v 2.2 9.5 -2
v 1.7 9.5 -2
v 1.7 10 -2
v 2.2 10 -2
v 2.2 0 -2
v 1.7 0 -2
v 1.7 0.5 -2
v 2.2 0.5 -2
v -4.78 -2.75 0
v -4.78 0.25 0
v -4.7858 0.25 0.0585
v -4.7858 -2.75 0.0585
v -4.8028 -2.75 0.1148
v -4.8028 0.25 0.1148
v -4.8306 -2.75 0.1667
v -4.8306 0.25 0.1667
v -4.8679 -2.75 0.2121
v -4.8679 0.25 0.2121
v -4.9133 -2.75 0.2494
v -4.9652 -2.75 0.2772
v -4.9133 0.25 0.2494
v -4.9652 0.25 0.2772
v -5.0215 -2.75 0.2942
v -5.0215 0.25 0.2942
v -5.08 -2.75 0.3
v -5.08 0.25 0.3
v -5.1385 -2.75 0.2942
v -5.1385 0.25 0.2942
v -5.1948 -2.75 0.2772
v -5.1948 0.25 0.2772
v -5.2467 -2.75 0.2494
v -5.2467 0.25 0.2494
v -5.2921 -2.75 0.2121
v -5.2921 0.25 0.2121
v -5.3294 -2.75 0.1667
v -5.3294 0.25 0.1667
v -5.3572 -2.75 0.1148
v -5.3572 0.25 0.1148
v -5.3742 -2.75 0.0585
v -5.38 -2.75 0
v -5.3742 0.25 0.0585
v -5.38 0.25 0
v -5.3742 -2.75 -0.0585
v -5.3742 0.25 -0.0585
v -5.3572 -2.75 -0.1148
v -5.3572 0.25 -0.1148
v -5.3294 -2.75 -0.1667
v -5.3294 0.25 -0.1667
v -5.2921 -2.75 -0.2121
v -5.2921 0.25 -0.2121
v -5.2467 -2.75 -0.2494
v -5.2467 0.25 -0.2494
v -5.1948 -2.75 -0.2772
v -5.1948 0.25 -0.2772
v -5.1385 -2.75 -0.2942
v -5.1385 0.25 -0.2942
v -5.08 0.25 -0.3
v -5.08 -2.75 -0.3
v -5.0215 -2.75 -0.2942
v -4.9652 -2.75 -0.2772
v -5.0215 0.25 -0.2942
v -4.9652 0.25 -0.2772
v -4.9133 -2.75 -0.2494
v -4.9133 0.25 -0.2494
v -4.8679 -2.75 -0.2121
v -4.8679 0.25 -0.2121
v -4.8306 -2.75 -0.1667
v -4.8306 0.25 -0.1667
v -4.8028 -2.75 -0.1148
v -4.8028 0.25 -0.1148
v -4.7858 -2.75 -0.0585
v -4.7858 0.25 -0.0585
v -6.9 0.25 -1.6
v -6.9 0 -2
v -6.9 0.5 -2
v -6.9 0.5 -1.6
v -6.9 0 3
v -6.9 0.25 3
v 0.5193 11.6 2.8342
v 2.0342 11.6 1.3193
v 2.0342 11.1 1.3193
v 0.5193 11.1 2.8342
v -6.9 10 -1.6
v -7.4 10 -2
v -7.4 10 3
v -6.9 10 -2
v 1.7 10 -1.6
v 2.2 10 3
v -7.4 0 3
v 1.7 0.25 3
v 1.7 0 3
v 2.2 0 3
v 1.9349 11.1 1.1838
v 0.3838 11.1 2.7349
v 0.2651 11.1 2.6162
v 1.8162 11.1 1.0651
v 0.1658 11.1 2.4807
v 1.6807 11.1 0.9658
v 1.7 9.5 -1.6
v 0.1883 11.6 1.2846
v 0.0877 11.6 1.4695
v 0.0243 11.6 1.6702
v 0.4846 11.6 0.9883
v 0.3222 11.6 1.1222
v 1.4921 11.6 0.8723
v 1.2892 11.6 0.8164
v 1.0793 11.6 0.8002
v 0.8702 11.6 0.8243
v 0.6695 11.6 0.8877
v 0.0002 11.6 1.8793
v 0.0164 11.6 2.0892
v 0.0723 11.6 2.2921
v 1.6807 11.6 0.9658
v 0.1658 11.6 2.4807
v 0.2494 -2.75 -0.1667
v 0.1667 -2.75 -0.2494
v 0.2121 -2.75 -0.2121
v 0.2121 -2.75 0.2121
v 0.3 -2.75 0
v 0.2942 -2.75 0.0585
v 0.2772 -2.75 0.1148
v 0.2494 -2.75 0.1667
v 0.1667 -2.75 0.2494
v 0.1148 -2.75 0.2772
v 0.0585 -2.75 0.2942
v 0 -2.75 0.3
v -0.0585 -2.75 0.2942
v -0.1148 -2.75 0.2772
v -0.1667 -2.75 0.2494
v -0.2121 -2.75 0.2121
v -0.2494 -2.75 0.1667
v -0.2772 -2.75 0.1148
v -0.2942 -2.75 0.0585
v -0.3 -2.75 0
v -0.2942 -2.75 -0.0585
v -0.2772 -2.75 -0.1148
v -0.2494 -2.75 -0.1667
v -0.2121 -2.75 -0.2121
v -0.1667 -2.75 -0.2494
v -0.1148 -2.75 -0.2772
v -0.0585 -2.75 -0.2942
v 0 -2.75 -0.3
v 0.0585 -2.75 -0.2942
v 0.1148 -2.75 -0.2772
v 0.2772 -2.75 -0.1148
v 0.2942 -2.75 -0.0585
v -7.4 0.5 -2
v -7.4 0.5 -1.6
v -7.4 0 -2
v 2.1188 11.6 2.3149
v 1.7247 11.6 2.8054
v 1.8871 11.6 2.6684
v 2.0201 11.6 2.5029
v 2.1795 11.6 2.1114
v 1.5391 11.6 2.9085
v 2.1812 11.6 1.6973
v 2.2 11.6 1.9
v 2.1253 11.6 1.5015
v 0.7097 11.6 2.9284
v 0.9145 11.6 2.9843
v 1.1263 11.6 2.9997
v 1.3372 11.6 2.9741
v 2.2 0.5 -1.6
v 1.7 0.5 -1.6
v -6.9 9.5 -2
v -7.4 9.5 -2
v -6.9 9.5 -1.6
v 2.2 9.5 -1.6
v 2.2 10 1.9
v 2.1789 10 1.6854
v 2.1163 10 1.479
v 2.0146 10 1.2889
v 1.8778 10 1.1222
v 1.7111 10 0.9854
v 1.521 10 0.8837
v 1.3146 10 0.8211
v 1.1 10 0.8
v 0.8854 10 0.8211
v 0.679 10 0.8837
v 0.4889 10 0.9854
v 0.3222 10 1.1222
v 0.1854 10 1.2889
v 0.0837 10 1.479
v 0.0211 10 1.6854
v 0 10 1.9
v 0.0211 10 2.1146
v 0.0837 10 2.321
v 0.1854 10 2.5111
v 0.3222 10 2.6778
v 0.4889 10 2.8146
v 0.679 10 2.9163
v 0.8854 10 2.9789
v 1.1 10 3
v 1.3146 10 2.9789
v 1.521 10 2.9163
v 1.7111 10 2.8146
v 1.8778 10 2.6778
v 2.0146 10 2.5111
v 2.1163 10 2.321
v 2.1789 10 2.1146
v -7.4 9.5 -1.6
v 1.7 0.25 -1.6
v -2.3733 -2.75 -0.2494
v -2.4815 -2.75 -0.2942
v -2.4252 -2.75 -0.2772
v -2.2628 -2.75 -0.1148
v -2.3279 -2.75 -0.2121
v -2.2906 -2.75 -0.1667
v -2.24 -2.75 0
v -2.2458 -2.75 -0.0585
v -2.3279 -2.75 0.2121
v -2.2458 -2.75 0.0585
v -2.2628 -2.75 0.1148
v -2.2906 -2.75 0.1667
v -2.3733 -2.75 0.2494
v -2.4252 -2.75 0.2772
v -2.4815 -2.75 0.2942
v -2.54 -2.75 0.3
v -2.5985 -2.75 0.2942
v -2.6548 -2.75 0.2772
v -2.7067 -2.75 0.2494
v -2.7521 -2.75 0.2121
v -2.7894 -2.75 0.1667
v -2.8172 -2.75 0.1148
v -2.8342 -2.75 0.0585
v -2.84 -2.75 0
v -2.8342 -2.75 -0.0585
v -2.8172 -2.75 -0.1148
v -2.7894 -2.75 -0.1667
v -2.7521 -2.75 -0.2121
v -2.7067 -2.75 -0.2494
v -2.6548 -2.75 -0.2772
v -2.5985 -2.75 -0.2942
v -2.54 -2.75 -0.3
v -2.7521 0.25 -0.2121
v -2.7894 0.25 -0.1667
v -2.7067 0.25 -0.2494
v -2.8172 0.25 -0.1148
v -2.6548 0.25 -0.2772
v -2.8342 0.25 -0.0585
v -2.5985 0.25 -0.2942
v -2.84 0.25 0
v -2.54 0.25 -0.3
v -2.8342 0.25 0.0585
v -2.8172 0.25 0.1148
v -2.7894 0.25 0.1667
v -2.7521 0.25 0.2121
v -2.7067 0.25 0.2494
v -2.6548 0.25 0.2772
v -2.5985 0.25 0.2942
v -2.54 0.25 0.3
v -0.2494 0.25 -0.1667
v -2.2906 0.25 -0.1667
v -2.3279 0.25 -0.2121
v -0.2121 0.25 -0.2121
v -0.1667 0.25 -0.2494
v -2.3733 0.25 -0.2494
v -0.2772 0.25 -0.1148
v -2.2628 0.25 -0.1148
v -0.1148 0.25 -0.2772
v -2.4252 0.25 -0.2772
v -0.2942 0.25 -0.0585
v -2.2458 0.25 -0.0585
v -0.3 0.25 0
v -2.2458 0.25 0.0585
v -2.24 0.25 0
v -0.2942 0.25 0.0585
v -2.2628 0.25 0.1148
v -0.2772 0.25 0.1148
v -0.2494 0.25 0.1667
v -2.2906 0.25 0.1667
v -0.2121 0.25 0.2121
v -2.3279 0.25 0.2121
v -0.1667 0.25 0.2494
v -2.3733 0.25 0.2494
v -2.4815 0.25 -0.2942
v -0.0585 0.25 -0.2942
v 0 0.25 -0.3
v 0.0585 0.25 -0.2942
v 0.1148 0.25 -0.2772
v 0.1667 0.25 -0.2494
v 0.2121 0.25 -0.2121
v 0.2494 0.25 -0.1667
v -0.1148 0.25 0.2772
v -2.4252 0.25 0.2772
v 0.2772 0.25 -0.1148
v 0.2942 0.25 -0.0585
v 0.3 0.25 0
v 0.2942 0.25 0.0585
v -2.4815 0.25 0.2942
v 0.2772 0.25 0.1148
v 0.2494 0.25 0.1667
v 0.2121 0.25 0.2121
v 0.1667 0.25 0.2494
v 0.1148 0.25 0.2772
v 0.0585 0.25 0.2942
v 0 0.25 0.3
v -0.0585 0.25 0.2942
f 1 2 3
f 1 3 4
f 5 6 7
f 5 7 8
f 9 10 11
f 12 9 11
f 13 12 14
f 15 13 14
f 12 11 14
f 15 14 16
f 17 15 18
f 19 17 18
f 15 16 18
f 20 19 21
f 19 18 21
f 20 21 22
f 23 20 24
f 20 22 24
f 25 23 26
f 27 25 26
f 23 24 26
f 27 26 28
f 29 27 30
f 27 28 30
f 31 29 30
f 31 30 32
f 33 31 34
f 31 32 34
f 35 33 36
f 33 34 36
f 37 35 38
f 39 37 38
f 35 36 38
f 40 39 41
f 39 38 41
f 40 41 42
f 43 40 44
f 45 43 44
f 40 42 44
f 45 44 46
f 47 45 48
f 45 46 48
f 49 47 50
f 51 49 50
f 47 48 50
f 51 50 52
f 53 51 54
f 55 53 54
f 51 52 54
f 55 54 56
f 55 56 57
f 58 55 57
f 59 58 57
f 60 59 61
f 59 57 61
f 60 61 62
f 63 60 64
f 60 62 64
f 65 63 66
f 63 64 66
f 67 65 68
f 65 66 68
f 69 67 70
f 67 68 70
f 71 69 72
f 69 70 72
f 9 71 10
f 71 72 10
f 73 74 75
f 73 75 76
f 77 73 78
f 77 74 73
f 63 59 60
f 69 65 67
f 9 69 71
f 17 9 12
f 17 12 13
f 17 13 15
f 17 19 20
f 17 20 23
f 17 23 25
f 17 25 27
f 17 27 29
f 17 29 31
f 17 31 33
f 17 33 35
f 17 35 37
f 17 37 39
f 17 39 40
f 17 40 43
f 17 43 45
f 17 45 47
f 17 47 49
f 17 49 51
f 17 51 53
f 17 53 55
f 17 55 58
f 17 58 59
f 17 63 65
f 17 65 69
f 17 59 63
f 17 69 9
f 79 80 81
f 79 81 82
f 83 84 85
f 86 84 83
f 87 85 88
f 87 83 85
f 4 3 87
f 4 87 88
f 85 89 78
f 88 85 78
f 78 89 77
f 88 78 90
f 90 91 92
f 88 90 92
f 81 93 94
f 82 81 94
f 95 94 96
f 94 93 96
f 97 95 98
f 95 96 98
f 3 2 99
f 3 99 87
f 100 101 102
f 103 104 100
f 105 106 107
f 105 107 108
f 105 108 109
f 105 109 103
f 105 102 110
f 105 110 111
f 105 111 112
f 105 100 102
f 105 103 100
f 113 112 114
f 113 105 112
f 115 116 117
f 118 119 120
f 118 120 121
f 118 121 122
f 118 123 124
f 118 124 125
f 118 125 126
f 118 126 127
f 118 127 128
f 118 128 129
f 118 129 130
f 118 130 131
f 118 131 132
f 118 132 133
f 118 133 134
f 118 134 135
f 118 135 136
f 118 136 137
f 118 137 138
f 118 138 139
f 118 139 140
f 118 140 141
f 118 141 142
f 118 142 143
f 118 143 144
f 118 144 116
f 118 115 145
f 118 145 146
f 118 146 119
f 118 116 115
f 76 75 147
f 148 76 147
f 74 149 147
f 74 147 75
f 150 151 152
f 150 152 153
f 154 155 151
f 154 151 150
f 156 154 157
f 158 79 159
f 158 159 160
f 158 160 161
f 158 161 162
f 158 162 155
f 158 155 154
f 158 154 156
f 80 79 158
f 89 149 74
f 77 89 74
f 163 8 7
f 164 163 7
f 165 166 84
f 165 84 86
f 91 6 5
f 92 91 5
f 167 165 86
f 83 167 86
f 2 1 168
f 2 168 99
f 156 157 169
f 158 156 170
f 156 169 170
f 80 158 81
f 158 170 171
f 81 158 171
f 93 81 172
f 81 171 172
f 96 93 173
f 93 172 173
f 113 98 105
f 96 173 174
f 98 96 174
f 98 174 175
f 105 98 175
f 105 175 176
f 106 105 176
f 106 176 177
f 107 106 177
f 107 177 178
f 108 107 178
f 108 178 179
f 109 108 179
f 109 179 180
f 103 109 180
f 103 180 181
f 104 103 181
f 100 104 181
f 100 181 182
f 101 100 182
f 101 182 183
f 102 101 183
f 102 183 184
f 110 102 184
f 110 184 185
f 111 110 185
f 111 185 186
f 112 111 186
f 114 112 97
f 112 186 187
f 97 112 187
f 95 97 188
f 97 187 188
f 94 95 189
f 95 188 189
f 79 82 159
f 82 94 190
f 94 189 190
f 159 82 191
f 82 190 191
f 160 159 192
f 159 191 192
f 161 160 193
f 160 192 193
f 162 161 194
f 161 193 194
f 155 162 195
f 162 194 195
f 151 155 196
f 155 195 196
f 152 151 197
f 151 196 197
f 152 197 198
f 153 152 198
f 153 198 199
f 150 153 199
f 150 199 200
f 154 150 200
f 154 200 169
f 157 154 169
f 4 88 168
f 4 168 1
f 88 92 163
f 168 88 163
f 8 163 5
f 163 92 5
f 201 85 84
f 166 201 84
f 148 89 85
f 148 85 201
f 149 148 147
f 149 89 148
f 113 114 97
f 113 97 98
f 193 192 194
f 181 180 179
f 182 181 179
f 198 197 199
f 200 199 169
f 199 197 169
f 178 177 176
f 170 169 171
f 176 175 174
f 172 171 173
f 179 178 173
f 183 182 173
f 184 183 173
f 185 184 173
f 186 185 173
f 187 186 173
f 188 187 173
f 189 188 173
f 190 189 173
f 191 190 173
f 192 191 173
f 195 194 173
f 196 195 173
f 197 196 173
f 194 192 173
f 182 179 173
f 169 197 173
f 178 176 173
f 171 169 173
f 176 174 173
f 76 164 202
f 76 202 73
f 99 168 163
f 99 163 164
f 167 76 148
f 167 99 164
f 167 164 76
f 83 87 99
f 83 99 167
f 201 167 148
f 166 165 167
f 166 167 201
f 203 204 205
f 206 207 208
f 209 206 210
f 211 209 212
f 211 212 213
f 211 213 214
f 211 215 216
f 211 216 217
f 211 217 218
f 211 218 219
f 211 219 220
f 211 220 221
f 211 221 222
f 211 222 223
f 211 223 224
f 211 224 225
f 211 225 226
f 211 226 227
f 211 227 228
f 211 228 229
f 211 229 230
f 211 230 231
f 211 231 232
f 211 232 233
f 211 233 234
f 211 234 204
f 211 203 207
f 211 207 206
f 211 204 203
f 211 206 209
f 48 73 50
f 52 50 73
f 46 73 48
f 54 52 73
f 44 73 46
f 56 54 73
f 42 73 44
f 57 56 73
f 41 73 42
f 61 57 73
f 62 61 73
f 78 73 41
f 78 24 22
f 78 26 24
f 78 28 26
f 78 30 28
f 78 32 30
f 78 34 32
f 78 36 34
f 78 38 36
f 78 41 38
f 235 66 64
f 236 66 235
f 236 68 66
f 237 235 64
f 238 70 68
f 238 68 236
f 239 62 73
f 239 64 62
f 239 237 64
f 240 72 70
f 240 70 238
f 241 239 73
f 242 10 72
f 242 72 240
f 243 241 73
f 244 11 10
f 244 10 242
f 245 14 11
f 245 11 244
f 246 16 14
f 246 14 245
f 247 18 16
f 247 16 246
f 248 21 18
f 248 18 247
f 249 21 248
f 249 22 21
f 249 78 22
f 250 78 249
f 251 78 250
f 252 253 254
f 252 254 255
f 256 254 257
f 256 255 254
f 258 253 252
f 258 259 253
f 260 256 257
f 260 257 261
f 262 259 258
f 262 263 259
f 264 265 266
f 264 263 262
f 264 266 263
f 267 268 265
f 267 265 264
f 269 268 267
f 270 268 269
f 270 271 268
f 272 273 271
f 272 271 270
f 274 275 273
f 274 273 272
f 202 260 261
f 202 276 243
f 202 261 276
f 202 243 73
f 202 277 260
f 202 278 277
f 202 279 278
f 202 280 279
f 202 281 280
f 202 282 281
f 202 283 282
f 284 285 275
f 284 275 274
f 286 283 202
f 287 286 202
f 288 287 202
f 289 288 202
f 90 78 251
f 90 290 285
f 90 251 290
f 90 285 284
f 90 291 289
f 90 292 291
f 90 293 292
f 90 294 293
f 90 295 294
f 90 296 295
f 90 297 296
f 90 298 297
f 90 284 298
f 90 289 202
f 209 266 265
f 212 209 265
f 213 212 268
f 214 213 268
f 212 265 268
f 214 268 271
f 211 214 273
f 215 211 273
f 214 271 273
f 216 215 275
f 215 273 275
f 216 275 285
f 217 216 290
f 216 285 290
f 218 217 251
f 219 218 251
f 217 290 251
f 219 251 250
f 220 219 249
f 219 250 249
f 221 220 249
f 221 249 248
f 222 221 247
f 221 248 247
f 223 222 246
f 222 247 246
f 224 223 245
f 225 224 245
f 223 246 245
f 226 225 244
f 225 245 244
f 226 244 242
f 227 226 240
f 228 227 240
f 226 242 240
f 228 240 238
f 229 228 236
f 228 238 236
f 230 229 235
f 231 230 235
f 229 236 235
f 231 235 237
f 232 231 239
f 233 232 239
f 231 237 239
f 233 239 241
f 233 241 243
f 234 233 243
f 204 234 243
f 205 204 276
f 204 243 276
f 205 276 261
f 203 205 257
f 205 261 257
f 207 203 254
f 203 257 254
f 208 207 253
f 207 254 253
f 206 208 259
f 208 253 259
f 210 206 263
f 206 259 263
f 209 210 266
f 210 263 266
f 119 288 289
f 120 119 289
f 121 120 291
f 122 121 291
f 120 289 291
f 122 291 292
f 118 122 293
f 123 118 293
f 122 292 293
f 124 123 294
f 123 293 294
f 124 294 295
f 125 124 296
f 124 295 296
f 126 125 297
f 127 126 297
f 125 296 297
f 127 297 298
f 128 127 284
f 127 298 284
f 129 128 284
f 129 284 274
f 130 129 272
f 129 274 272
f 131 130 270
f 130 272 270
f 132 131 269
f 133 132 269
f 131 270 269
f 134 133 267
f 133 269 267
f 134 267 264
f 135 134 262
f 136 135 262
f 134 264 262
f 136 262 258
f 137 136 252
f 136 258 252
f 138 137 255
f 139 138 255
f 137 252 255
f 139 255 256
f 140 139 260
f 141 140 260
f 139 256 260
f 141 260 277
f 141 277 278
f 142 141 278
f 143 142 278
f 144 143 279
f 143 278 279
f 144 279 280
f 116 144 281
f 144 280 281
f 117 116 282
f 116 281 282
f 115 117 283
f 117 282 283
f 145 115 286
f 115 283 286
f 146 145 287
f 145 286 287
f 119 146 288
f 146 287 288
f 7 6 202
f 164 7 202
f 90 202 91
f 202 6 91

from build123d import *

# Parameters (mm, degrees)
COMPONENT_OUTLINE_W = 9.6
COMPONENT_OUTLINE_H = 5
BOSS_EXTRUDE1_DEPTH = 10
SKETCH1_OUTSIDE_W   = 14.548
SKETCH1_OUTSIDE_H   = 14.948
SKETCH1_OUTSIDE_W_2 = 0.5
SKETCH1_OUTSIDE_H_2 = 0.5
CUT_EXTRUDE1_DEPTH  = 0.4
SKETCH2_W           = 8.6
SKETCH2_H           = 4.6
CUT_EXTRUDE2_DEPTH  = 0.25
SKETCH3_R           = 0.3
BOSS_EXTRUDE2_DEPTH = 3
SKETCH4_R           = 1.1
BOSS_EXTRUDE3_DEPTH = 1.6
CUT_EXTRUDE3_DEPTH  = 0.5


with BuildPart() as part:
    # Component_Outline → Boss-Extrude1 (new body)
    with BuildSketch(Plane(origin=(0, 0, 0), x_dir=(1, 0, 0), z_dir=(0, 1, 0))):
        with Locations((-2.6, -0.5)):
            Rectangle(COMPONENT_OUTLINE_W, COMPONENT_OUTLINE_H)
    extrude(amount=BOSS_EXTRUDE1_DEPTH)

    # Sketch1 outside → Cut-Extrude1 (cut)
    with BuildSketch(Plane(origin=(0, 0, -2), x_dir=(-1, 0, 0), z_dir=(0, 0, -1))):
        with Locations((2.6, 5)):
            Rectangle(SKETCH1_OUTSIDE_W, SKETCH1_OUTSIDE_H)
        with Locations((7.15, 9.75)):
            Rectangle(SKETCH1_OUTSIDE_W_2, SKETCH1_OUTSIDE_H_2, mode=Mode.SUBTRACT)
        with Locations((-1.95, 9.75)):
            Rectangle(SKETCH1_OUTSIDE_W_2, SKETCH1_OUTSIDE_H_2, mode=Mode.SUBTRACT)
        with Locations((-1.95, 0.25)):
            Rectangle(SKETCH1_OUTSIDE_W_2, SKETCH1_OUTSIDE_H_2, mode=Mode.SUBTRACT)
        with Locations((7.15, 0.25)):
            Rectangle(SKETCH1_OUTSIDE_W_2, SKETCH1_OUTSIDE_H_2, mode=Mode.SUBTRACT)
    extrude(amount=-CUT_EXTRUDE1_DEPTH, mode=Mode.SUBTRACT)

    # Sketch2 → Cut-Extrude2 (cut)
    with BuildSketch(Plane.XZ):
        with Locations((-2.6, 0.7)):
            Rectangle(SKETCH2_W, SKETCH2_H)
    extrude(amount=-CUT_EXTRUDE2_DEPTH, mode=Mode.SUBTRACT)

    # Sketch3 → Boss-Extrude2 (add)
    with BuildSketch(Plane.XZ.offset(-0.25)):
        Circle(SKETCH3_R)
        with Locations((-2.54, 0)):
            Circle(SKETCH3_R)
        with Locations((-5.08, 0)):
            Circle(SKETCH3_R)
    extrude(amount=BOSS_EXTRUDE2_DEPTH)


with BuildPart() as body_2:
    # Sketch4 → Boss-Extrude3 (new body)
    with BuildSketch(Plane(origin=(0, 10, 0), x_dir=(1, 0, 0), z_dir=(0, 1, 0))):
        with Locations((1.1, -1.9)):
            Circle(SKETCH4_R)
    extrude(amount=BOSS_EXTRUDE3_DEPTH)

    # Sketch5 → Cut-Extrude3 (cut)
    with BuildSketch(Plane(origin=(0, 11.6, 0), x_dir=(1, 0, 0), z_dir=(0, 1, 0))):
        with BuildLine():
            Line((0.165760434, -2.480686175), (1.680686175, -0.965760434))
            ThreePointArc((1.680686175, -0.965760434), (1.877817459, -1.122182541), (2.034239566, -1.319313825))
            Line((2.034239566, -1.319313825), (0.519313825, -2.834239566))
            ThreePointArc((0.519313825, -2.834239566), (0.322182541, -2.677817459), (0.165760434, -2.480686175))
        make_face()
    extrude(amount=-CUT_EXTRUDE3_DEPTH, mode=Mode.SUBTRACT)


solid = Compound([part.part, body_2.part])
